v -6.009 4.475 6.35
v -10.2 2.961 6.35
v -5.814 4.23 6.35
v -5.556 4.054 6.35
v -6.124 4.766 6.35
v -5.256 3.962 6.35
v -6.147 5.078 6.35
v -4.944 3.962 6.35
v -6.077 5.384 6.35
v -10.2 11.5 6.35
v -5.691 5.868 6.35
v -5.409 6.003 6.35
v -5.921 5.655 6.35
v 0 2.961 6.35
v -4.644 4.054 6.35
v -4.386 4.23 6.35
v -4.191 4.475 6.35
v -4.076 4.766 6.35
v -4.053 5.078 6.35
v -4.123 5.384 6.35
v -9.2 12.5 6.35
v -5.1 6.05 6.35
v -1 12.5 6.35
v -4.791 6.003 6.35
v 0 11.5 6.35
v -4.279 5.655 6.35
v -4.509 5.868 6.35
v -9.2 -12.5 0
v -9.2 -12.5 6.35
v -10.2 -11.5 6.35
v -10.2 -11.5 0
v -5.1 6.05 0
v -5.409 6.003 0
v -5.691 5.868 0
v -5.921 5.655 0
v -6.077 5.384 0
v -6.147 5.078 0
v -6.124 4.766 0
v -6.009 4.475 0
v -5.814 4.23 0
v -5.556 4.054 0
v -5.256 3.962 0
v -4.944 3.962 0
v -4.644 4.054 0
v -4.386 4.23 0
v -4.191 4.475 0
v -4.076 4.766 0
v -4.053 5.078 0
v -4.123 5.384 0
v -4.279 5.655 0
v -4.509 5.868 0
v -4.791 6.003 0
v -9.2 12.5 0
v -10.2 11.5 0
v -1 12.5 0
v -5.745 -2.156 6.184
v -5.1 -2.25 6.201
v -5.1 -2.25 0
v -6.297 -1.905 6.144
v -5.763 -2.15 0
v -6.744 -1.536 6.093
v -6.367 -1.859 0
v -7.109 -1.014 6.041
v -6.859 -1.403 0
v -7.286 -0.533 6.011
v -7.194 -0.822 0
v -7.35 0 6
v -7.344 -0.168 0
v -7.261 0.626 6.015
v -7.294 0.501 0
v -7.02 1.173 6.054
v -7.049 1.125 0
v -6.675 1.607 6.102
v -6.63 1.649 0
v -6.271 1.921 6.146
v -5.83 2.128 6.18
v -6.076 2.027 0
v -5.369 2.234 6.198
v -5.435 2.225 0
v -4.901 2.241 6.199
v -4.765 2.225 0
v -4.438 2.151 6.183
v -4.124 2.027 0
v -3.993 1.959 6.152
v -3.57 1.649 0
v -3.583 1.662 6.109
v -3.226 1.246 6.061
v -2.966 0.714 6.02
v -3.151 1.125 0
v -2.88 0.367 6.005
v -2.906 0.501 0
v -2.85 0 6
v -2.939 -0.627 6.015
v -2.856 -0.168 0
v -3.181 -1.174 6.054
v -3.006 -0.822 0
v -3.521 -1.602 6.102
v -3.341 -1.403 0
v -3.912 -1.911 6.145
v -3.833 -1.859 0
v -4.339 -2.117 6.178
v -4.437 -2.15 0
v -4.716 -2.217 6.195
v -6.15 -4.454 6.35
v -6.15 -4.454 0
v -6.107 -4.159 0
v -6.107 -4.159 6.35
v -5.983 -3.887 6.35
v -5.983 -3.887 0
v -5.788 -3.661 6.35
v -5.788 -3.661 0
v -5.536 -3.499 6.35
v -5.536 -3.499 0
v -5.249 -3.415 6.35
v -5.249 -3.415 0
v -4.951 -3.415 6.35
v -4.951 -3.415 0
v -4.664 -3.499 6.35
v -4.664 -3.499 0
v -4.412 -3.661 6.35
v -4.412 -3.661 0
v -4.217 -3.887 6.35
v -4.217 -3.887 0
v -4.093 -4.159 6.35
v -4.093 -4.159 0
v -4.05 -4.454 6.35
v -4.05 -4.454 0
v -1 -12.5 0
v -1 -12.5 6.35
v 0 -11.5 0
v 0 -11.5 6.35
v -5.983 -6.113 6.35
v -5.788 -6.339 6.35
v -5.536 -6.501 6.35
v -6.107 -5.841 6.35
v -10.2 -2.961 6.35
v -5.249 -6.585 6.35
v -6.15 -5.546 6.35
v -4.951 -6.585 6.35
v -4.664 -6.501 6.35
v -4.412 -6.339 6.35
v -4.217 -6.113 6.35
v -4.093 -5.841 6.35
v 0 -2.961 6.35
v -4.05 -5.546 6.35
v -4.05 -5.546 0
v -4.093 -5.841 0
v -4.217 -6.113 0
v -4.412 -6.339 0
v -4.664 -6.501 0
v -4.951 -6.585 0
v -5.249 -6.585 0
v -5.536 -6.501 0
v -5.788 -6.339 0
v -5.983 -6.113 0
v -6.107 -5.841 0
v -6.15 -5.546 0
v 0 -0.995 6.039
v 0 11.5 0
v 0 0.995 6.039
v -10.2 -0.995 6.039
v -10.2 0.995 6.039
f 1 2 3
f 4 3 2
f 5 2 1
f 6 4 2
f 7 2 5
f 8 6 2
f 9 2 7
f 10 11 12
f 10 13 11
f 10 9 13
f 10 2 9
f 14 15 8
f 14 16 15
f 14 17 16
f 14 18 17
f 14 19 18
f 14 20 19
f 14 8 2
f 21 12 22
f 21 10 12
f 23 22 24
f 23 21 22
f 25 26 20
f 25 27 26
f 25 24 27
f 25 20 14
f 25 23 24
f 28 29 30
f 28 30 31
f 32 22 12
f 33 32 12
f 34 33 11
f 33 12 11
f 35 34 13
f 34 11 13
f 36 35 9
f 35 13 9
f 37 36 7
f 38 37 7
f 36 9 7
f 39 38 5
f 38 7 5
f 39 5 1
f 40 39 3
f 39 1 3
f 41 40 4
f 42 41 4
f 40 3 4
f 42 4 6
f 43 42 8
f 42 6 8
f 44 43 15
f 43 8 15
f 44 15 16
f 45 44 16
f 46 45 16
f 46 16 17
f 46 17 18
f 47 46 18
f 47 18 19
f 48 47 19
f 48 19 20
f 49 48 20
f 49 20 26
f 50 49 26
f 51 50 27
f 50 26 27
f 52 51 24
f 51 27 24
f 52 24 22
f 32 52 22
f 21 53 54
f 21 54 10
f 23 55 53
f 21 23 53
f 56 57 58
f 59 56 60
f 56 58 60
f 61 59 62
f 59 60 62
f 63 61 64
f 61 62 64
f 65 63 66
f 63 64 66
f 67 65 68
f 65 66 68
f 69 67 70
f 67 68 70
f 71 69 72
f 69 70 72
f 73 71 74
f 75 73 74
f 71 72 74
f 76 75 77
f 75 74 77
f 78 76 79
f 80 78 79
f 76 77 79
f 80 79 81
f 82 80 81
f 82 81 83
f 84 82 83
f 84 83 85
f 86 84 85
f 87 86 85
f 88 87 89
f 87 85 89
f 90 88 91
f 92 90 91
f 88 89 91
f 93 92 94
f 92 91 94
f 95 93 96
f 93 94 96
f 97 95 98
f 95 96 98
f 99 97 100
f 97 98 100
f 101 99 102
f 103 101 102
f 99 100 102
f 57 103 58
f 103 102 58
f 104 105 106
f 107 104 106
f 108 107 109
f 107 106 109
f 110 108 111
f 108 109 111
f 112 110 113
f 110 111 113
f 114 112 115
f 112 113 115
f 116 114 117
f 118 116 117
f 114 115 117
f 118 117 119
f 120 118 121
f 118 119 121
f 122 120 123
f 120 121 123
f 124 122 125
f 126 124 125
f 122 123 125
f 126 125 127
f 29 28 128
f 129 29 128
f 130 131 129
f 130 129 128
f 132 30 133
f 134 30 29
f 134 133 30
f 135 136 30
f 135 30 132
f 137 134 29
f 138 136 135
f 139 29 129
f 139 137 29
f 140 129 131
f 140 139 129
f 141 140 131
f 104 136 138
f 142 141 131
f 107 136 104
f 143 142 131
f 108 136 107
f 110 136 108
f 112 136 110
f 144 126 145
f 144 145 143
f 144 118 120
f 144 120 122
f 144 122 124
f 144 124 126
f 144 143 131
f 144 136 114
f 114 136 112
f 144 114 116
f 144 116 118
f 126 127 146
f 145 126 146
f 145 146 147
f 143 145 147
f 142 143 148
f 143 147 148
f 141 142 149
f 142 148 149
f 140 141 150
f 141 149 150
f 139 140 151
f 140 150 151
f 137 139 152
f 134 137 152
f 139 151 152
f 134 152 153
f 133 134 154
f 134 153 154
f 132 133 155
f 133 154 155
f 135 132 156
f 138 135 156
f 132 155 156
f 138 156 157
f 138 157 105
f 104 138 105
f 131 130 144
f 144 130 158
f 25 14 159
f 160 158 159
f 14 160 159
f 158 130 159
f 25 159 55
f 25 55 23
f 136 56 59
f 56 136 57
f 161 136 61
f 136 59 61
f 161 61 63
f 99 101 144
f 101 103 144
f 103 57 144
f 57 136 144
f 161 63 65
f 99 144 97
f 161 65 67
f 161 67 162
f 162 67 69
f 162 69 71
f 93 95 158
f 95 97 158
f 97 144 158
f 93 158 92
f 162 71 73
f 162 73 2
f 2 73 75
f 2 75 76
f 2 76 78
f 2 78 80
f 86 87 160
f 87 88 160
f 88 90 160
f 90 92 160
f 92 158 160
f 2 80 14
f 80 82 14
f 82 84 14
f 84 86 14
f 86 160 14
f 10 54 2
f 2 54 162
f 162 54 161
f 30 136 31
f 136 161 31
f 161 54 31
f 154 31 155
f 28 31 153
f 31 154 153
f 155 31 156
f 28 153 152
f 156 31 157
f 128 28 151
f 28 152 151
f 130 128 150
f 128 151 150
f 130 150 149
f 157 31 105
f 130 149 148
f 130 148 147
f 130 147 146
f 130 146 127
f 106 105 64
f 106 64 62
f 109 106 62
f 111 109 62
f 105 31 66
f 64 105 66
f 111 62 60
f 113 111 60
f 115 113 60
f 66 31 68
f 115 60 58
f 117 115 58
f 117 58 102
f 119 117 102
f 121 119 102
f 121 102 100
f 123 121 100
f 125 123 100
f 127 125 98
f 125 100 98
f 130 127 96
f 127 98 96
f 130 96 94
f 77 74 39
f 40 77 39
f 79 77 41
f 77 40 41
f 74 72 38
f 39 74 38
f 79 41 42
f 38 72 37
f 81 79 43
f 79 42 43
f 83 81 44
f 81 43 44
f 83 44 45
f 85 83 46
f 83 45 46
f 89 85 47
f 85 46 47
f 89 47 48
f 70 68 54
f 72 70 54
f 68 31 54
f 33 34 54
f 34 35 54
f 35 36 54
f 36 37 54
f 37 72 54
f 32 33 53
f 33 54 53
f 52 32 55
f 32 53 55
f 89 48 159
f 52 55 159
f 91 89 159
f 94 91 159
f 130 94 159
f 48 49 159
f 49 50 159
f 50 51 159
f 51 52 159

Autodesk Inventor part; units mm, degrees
ref_plane "YZ Plane" through (0, 0, 0) normal (1, 0, 0) x (0, 1, 0)
ref_plane "XZ Plane" through (0, 0, 0) normal (0, 1, 0) x (-1, 0, 0)
ref_plane "XY Plane" through (0, 0, 0) normal (0, 0, 1) x (1, 0, 0)
sketch "Sketch1" plane through (0, 0, 0) normal (0, 0, 1) x (1, 0, 0)
  line L0 (-10.2, -12.5) -> (0, -12.5)
  line L1 (0, -12.5) -> (0, 12.5)
  line L2 (0, 12.5) -> (-10.2, 12.5)
  line L3 (-10.2, 12.5) -> (-10.2, -12.5)
  point P0 (0, 0)
  dimension "MIRROR_WIDTH" = 10.2
  dimension "WIDTH" = 10.2
  dimension "LENGTH" = 25
  dimension "d3" = 12.5
extrude "Extrusion1" add sketch "Sketch1" along normal blind 6.35
sketch "Sketch2" plane through (0, 0, 6.35) normal (0, 0, 1) x (1, 0, 0)
  line L0 (0, 12.5) -> (2, 12.5)
  line L1 (2, 12.5) -> (2, -12.5)
  line L2 (2, -12.5) -> (0, -12.5)
  line L3 (0, -12.5) -> (0, 12.5)
  point P0 (0, 0)
  dimension "d6" = 2
  dimension "d7" = 25
  dimension "d8" = 12.5
  dimension "d9" = 0
extrude "Extrusion2" [suppressed]
sketch "Sketch3" plane through (0, 0, 6.35) normal (0, 0, 1) x (1, 0, 0)
  point P0 (0, 0)
  point P1 (-5.1, 0)
  dimension "d12" = 5.1
  dimension "d13" = 0
hole "Hole1" at (-5.1, 0, 6.35) direction (0, 0, -1) diameter 4.5 depth 12.3 clearance for "Socket Head Cap Screw" size "#8" standard "Ansi Unified Screw Threads"
sketch "Sketch4" plane through (0, 0, 0) normal (0, 0, -1) x (-1, 0, 0)
  circle A0 centre (5.1, 0) radius 2.25 projected
  line L0 (5.1, -5.5455) -> (5.1, -4.4545) construction
  line L1 (6.15, -5.5455) -> (6.15, -4.4545)
  line L2 (4.05, -4.4545) -> (4.05, -5.5455)
  arc A1 (4.05, -5.5455) -> (6.15, -5.5455) centre (5.1, -5.5455) ccw
  arc A2 (6.15, -4.4545) -> (4.05, -4.4545) centre (5.1, -4.4545) ccw
  point P0 (0, 0)
  point P1 (5.1, -5)
  point P2 (5.1, 5)
  dimension "d21" = 0
  dimension "d22" = 0
  dimension "d23" = 5
  dimension "d24" = 5
  dimension "d43" = 1.05
  dimension "d44" = 1.091
hole "Hole2" at (-5.1, 5, 0) direction (0, 0, 1) diameter 2.1 end through all
extrude "Extrusion3" cut sketch "Sketch4" against normal through all contours A1 L2 A2 L1
chamfer "Chamfer1" distance 1 angle 45 4 edges at (-10.2, -12.5, 3.175) (0, -12.5, 3.175) (0, 12.5, 3.175) (-10.2, 12.5, 3.175)
sketch "Sketch6" plane through (0, -11.5, 0) normal (1, 0, 0) x (0, 0, -1)
  circle A0 centre (-18.7, 11.5) radius 12.7
  point P0 (0, 11.5)
  dimension "d50" = 25.4
  dimension "d51" = 0
  dimension "d52" = 18.7
extrude "Extrusion4" cut sketch "Sketch6" against normal up to surface (10.2 mm away)
equation "\"WIDTH\" = MIRROR_WIDTH"
equation "\"d3\" = 0.5 * LENGTH"
equation "\"d7\" = LENGTH"
equation "\"d8\" = 0.5 * LENGTH"
equation "\"d12\" = 0.5 * MIRROR_WIDTH"
equation "\"d24\" = d23"
properties part number "POLARIS-K05S1-adapter"
